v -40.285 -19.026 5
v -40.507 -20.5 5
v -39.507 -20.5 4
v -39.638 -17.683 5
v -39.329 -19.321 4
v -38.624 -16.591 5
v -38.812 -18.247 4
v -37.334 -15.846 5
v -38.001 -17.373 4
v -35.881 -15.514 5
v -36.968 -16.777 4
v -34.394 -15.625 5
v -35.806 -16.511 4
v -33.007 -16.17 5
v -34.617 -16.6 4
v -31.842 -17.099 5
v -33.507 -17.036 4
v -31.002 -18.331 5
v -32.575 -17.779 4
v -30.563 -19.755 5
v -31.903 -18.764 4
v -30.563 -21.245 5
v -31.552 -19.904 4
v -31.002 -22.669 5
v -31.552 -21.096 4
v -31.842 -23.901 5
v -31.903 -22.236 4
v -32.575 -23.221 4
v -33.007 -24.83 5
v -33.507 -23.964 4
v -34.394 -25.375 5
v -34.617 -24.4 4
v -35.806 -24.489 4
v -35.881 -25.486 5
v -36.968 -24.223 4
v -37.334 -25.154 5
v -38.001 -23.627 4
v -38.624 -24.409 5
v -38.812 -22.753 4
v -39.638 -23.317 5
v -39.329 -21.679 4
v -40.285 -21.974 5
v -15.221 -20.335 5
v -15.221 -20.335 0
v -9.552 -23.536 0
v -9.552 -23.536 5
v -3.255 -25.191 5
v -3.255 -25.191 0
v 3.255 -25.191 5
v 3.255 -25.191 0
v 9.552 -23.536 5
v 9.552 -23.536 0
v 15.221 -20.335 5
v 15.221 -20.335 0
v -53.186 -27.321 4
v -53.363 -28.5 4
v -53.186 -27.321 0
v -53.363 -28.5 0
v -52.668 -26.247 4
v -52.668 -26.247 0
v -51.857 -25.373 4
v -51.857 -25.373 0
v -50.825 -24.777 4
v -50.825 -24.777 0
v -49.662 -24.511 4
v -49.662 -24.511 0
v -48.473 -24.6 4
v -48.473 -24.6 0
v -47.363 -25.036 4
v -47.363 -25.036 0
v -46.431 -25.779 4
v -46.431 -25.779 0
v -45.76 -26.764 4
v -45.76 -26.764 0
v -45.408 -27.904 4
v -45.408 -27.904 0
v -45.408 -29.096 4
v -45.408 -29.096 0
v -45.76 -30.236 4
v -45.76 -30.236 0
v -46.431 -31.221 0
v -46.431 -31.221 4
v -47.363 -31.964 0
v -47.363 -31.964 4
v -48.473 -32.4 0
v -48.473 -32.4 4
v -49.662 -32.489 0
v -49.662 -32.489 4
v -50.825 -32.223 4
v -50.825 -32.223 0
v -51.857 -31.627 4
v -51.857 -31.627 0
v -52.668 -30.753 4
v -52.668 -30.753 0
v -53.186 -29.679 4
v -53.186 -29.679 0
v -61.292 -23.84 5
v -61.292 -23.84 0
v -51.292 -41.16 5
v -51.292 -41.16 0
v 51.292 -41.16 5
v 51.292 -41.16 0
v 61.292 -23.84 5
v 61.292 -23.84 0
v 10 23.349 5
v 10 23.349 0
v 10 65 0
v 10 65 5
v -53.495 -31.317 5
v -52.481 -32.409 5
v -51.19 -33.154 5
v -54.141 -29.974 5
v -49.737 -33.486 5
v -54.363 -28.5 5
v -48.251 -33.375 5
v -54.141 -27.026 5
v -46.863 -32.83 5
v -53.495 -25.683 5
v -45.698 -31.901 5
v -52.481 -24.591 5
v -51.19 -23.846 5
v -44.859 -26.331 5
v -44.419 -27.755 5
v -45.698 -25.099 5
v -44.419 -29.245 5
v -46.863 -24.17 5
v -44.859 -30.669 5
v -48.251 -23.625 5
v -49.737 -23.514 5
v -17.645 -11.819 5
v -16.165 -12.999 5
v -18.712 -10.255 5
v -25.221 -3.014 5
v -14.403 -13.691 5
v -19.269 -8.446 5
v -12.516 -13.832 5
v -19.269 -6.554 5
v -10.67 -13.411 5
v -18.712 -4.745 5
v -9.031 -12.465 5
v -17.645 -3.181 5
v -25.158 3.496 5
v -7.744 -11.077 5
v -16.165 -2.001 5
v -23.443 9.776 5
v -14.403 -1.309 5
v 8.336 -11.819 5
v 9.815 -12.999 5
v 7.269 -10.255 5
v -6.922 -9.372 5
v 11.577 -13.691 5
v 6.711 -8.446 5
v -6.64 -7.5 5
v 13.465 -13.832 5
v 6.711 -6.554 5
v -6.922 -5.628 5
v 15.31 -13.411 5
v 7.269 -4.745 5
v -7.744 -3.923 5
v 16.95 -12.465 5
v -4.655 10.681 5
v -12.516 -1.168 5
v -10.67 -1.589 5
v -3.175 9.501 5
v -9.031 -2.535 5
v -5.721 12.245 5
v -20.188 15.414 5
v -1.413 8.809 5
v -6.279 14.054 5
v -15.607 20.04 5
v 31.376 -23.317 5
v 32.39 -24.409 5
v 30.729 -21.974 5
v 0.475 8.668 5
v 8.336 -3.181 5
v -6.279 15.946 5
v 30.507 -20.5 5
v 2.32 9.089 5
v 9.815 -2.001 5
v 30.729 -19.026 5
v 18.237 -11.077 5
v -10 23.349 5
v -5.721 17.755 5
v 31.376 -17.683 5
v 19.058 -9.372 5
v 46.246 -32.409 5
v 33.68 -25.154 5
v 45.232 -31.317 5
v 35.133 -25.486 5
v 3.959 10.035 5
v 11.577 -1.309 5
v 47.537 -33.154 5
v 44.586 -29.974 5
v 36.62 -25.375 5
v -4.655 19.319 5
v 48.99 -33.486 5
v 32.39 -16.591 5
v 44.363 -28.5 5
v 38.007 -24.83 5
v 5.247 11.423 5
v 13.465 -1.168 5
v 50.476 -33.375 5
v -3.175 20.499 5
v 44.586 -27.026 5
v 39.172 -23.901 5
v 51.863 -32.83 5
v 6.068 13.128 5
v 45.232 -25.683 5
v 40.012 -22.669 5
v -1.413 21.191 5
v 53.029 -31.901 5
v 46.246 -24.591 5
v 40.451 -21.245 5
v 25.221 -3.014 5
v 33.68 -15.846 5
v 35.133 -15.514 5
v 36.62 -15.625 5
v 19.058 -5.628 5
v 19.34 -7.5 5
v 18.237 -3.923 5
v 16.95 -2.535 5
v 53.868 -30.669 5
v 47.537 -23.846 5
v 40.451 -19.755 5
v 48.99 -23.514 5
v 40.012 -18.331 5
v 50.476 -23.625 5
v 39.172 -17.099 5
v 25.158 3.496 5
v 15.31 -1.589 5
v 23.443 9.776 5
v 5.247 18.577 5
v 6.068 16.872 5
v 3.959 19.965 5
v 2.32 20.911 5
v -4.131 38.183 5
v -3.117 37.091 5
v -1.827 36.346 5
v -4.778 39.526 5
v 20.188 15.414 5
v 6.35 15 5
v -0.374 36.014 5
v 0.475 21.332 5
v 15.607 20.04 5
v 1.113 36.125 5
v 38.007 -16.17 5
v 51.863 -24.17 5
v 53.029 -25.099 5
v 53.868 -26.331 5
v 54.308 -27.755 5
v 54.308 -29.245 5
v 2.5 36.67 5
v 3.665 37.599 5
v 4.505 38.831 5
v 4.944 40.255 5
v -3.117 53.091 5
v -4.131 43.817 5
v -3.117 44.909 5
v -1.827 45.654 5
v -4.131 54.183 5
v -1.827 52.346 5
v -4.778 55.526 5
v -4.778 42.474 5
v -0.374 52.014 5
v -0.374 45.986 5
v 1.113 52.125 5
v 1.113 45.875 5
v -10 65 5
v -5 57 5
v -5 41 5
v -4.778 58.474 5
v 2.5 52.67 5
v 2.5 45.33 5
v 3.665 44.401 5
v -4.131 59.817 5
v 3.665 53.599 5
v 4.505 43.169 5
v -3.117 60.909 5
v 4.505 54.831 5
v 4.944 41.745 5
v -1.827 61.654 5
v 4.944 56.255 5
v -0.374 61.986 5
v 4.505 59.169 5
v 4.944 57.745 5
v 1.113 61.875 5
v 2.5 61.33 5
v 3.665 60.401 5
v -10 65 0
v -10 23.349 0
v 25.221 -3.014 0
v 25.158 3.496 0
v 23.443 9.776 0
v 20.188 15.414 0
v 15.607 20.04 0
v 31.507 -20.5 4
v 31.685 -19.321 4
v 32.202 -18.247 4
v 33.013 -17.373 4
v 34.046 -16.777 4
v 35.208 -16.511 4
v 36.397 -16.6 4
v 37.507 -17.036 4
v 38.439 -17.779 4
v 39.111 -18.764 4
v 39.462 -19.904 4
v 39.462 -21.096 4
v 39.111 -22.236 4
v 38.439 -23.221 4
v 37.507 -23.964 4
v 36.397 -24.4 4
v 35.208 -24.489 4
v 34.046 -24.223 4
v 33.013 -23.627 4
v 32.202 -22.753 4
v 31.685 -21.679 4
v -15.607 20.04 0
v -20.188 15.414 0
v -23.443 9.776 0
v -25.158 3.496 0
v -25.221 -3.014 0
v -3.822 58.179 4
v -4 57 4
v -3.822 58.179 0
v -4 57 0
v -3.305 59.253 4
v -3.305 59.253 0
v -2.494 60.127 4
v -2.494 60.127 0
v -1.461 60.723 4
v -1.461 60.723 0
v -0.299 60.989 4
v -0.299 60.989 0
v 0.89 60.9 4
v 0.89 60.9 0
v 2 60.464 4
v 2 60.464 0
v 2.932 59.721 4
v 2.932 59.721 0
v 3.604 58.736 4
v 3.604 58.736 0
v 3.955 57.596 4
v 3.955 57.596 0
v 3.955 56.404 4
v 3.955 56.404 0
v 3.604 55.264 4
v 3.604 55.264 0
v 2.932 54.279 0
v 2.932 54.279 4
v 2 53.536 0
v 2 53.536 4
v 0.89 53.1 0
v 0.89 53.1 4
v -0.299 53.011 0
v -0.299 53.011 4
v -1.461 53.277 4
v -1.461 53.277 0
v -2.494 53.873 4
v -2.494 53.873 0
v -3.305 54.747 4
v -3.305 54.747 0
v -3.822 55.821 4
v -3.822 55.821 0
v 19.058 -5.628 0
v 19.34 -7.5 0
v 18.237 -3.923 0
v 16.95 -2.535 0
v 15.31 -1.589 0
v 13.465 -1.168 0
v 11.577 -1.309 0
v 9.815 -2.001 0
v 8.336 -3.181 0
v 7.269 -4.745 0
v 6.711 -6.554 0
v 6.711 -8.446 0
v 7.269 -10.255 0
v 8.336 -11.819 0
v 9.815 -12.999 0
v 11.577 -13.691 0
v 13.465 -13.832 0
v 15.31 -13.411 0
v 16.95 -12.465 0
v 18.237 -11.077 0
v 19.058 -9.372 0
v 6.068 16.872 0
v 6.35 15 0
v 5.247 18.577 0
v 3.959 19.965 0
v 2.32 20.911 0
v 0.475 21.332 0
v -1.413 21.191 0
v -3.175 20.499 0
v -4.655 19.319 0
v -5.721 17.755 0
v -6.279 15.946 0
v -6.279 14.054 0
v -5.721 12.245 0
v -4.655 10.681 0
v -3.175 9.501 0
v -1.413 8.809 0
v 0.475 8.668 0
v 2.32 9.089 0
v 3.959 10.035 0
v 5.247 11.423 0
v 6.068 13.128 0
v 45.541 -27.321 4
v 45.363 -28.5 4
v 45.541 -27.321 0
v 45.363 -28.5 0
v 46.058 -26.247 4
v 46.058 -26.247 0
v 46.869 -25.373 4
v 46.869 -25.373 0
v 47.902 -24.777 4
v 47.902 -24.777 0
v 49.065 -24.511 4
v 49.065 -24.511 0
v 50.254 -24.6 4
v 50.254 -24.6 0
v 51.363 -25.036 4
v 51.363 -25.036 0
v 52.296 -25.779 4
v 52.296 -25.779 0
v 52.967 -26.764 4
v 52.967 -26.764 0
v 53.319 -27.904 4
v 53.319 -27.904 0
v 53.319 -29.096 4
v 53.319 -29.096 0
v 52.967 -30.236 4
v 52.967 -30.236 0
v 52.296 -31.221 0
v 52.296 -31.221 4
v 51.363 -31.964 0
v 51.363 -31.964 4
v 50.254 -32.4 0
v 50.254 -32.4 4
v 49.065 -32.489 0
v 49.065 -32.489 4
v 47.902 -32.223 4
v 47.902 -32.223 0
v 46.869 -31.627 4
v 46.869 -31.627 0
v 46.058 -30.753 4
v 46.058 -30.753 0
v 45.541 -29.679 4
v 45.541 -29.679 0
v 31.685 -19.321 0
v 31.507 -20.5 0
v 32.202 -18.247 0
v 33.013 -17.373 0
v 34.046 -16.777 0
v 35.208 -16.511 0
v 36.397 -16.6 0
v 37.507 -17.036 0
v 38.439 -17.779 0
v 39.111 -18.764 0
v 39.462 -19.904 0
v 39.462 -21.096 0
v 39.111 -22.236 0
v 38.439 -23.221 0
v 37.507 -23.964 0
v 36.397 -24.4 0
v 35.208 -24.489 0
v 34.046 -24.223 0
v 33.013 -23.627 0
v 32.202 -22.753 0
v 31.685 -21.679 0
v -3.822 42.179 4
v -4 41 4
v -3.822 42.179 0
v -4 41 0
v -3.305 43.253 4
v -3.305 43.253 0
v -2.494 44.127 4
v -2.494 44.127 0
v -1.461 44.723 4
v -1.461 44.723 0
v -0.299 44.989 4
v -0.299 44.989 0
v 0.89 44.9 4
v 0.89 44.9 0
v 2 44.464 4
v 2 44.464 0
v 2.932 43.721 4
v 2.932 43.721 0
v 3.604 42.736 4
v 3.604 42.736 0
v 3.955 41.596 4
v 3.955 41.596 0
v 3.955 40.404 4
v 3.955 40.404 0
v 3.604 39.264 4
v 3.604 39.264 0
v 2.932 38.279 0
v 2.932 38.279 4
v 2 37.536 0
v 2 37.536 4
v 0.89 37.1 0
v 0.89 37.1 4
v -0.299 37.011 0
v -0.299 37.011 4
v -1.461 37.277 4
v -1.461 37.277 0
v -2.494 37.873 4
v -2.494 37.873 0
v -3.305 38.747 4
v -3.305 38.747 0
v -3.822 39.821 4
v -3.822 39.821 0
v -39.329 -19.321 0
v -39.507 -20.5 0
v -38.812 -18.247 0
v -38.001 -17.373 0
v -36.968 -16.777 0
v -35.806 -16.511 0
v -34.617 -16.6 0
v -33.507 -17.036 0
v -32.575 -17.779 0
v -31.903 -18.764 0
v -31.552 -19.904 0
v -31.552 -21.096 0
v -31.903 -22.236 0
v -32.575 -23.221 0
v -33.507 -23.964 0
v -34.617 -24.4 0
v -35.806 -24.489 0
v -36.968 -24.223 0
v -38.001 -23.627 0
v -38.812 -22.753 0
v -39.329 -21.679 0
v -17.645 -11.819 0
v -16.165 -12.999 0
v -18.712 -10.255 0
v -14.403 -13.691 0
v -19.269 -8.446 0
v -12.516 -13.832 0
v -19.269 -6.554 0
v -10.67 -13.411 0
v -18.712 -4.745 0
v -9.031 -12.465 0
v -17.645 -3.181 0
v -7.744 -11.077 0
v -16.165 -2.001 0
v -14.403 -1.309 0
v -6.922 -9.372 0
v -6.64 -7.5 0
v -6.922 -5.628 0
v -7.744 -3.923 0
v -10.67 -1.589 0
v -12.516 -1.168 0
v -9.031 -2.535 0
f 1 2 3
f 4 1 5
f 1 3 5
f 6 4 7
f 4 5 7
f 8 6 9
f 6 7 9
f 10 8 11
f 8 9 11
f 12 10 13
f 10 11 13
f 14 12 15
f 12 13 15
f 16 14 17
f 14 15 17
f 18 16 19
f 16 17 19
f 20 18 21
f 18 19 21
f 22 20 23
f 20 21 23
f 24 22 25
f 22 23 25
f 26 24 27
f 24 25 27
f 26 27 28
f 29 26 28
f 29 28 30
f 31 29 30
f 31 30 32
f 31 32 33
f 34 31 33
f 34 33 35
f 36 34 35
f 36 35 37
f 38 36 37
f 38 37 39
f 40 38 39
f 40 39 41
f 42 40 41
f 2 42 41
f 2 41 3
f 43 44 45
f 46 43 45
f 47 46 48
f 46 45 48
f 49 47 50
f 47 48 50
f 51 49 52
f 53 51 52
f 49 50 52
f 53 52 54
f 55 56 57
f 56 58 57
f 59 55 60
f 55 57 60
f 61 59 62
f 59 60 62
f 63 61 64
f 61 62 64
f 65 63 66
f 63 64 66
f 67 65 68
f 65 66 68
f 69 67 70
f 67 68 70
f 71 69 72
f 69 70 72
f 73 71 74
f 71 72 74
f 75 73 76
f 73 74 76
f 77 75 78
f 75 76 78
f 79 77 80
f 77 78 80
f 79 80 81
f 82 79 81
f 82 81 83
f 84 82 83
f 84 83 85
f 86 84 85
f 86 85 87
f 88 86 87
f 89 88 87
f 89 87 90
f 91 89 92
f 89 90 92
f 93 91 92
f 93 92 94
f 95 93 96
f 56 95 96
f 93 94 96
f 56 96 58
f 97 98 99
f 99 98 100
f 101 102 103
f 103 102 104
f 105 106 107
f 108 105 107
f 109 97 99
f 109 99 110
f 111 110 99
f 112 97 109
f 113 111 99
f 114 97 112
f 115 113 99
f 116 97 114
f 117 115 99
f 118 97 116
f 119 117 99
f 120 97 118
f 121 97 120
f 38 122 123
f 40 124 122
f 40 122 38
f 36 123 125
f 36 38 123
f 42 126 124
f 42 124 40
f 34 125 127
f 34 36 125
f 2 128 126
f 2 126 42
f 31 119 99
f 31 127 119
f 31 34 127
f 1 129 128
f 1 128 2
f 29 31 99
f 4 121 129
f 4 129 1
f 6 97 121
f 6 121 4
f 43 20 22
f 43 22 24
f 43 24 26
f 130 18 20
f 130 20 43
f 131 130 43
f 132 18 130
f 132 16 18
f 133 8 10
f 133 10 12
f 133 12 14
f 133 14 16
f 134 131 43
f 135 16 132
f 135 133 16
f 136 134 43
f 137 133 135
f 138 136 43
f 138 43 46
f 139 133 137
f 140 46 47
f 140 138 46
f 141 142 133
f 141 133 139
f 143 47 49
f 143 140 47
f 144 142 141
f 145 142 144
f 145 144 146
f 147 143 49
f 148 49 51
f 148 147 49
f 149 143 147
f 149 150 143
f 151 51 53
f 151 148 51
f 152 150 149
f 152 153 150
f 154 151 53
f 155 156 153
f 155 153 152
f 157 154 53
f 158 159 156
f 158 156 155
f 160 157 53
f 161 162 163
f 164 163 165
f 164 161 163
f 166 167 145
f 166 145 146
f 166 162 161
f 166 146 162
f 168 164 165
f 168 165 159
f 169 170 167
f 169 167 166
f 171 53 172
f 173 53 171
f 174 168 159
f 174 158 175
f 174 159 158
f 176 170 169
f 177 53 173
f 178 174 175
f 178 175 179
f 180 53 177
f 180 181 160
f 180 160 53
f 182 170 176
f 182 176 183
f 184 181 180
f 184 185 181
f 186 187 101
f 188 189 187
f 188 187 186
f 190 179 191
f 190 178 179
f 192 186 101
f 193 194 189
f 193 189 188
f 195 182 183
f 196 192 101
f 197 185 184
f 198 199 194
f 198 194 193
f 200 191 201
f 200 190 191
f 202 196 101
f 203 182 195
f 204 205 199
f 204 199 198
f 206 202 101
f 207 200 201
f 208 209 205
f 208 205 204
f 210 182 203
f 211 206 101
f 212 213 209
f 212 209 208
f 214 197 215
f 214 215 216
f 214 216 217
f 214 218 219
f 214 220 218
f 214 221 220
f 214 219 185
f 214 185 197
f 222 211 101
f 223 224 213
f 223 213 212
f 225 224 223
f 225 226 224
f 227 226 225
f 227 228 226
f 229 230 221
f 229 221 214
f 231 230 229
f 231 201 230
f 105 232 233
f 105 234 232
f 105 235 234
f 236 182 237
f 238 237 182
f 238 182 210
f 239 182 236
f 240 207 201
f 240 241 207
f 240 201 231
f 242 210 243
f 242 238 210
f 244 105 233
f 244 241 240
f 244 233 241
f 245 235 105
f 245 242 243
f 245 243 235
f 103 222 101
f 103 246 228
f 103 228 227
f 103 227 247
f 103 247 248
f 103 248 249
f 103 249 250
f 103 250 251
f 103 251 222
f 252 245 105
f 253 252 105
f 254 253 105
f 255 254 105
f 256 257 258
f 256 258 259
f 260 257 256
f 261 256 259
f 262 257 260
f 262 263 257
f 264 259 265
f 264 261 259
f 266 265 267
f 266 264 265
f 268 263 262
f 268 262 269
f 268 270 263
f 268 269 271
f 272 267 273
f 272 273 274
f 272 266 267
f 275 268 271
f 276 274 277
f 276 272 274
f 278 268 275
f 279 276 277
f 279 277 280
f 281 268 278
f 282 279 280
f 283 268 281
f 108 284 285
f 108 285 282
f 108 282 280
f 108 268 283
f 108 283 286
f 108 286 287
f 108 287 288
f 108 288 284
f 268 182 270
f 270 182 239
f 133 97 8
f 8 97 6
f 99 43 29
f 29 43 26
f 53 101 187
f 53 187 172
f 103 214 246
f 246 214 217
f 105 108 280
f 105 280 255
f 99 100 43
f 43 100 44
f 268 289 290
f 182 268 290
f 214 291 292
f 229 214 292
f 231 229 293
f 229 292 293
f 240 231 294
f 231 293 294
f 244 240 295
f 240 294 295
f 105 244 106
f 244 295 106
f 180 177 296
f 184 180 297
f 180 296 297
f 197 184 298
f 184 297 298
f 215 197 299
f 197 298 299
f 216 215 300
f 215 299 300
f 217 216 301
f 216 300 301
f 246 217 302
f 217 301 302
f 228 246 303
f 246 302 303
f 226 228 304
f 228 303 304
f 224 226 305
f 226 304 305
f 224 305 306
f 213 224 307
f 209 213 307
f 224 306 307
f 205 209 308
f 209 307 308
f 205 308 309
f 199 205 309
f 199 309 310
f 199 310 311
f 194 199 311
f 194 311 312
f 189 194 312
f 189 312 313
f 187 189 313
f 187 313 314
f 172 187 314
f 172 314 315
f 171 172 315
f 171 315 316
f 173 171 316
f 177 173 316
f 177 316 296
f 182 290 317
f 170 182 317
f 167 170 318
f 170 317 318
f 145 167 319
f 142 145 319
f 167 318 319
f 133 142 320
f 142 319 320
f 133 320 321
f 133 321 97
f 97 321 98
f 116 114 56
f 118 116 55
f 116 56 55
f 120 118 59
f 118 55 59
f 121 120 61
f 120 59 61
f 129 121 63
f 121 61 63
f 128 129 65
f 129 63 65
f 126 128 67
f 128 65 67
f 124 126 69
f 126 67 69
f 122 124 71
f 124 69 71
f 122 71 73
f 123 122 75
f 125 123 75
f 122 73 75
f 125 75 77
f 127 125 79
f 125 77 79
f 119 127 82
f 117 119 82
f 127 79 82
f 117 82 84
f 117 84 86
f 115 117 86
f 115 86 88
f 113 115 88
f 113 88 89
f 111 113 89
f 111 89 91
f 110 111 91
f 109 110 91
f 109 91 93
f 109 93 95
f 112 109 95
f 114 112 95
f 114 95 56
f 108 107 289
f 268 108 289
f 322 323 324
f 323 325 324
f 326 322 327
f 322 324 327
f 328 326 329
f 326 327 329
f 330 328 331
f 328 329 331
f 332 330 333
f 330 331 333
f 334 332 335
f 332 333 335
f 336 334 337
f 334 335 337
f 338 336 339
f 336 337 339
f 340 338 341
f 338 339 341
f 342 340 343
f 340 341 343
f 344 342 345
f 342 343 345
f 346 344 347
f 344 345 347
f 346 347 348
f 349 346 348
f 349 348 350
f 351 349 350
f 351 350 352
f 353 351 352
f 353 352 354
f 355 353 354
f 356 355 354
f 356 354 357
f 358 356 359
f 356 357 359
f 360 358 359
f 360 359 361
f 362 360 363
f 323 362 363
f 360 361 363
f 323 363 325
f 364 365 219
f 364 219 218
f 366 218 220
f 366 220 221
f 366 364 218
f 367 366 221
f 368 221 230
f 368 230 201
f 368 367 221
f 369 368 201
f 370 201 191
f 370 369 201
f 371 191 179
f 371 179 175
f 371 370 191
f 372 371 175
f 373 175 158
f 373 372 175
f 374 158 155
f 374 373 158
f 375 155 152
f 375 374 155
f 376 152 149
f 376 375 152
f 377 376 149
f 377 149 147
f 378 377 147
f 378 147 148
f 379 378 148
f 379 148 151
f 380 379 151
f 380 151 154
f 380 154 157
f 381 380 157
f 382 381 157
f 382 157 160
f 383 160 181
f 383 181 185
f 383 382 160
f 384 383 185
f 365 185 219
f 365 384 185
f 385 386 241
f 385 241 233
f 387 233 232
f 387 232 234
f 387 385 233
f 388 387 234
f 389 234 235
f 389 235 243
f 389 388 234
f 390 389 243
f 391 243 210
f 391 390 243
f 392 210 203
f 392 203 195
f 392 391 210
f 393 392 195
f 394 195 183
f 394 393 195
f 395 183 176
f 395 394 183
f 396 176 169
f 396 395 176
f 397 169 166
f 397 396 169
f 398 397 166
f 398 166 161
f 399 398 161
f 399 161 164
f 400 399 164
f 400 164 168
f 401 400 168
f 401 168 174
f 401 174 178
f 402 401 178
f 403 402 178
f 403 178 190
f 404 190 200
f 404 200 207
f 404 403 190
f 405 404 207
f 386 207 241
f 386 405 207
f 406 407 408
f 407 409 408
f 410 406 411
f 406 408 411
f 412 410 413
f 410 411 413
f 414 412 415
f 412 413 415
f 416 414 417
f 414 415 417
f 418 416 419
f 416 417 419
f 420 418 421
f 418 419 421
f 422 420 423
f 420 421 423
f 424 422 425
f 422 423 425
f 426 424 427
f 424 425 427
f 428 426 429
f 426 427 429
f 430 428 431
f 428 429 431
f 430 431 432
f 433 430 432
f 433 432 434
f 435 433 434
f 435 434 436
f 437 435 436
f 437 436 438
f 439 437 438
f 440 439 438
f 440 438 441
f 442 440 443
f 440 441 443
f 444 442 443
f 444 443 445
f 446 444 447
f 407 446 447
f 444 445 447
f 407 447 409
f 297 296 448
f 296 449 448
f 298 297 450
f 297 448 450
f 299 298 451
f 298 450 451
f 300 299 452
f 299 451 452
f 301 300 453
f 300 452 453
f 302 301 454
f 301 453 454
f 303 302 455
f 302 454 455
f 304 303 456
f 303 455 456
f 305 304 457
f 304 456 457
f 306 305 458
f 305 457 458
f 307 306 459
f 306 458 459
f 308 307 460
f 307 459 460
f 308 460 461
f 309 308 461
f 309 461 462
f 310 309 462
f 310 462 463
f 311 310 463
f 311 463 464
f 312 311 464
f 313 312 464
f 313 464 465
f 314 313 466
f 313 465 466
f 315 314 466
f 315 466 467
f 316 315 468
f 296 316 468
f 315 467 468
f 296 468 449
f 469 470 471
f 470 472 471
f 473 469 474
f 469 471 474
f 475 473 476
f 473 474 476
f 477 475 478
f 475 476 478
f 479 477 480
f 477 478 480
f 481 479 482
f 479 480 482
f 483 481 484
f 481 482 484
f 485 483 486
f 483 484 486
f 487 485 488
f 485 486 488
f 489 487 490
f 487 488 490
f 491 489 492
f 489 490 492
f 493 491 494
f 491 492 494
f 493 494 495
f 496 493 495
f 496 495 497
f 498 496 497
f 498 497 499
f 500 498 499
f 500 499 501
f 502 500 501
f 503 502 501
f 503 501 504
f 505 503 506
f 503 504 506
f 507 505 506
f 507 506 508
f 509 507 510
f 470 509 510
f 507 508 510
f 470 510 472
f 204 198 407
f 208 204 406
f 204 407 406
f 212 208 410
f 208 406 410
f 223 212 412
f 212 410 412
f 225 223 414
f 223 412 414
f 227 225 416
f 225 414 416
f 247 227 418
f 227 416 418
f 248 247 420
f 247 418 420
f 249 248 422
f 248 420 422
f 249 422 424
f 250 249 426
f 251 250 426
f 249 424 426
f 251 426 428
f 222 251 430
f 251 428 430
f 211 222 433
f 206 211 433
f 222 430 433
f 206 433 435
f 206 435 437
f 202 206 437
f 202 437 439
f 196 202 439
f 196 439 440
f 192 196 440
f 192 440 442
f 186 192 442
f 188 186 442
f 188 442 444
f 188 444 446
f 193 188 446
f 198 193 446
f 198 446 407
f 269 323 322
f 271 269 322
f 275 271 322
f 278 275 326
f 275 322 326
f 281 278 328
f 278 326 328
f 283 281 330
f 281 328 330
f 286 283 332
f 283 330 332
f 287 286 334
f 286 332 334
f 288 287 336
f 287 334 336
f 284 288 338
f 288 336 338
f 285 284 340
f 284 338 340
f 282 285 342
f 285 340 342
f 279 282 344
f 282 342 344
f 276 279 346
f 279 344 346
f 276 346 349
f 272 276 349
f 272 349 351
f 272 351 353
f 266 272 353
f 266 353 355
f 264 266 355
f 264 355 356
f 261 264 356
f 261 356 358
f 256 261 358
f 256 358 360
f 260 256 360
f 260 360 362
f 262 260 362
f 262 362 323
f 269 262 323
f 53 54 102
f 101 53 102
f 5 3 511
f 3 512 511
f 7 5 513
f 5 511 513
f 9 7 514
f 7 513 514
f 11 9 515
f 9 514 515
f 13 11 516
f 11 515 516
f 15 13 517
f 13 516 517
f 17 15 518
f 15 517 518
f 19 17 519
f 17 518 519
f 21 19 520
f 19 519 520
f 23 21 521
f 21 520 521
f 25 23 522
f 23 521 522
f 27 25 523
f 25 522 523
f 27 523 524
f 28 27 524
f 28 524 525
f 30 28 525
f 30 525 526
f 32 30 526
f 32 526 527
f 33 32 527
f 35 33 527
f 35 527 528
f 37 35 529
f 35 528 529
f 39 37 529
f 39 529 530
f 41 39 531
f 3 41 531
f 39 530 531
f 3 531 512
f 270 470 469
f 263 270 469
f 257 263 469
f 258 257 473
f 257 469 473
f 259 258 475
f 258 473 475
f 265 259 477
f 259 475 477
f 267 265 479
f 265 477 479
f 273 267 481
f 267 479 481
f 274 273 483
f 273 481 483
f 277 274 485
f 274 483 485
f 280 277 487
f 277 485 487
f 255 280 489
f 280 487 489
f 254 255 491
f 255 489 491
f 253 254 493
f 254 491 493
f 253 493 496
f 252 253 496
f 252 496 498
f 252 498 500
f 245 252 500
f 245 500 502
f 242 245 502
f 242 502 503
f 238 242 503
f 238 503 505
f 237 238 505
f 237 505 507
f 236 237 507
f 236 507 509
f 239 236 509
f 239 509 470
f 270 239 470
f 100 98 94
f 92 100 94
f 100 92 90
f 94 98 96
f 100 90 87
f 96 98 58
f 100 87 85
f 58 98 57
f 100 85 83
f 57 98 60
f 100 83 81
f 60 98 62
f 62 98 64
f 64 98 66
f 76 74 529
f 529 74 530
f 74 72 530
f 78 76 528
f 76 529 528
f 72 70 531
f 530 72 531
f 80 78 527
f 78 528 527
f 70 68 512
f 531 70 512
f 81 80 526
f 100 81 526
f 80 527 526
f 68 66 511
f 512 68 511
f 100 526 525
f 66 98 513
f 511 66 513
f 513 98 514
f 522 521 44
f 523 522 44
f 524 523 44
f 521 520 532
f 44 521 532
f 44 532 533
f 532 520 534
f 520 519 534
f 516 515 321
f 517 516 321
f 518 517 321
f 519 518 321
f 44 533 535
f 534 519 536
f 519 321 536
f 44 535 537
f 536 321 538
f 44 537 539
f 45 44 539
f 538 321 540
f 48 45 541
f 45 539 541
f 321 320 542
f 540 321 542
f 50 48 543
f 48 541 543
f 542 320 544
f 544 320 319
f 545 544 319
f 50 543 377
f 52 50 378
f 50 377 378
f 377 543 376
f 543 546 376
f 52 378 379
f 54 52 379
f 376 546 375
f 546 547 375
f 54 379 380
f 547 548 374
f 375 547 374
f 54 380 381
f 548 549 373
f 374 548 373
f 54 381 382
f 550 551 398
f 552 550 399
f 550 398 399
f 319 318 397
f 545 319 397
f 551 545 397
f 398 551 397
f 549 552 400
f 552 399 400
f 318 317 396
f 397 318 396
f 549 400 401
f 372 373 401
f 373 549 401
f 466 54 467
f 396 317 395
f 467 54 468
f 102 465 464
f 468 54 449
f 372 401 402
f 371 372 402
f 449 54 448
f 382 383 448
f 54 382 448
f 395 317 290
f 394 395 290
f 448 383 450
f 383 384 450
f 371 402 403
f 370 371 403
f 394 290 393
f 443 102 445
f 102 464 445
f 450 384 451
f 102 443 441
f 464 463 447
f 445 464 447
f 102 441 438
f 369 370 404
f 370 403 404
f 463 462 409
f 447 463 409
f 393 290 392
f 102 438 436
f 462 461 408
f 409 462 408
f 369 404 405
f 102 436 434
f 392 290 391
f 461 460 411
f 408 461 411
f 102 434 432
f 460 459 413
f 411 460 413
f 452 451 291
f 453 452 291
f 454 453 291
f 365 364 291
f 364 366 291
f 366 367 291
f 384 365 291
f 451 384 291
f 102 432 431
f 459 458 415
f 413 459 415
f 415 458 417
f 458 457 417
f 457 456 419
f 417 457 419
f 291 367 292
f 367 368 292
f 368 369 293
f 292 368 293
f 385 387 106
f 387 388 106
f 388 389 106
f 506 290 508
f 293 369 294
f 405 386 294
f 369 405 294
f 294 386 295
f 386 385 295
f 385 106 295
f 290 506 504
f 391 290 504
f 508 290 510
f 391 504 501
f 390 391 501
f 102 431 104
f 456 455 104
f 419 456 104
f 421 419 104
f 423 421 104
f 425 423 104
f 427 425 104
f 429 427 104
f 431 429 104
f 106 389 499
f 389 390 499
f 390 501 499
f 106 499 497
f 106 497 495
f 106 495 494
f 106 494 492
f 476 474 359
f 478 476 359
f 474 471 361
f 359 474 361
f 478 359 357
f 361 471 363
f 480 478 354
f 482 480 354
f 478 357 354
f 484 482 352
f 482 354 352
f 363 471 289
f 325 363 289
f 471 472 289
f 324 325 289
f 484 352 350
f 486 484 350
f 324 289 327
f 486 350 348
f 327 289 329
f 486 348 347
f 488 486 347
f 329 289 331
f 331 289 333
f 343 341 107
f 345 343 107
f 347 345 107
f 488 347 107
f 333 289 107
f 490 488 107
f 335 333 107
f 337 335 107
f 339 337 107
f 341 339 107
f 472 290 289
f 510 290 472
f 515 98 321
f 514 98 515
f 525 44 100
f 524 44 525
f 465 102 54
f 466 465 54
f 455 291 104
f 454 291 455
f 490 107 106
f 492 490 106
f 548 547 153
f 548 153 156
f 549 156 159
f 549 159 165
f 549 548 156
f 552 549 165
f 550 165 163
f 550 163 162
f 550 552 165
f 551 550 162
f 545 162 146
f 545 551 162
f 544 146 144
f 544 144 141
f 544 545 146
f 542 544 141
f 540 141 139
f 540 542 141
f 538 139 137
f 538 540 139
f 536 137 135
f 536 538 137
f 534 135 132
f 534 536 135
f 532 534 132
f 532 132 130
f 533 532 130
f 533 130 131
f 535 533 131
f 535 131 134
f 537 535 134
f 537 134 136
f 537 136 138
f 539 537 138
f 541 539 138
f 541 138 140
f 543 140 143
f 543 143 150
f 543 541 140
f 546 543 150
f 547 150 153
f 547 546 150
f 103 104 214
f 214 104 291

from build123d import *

# Parameters (mm, degrees)
F0_R           = 6.35
F1_DEPTH       = 5
F3_D           = 8
F3_CSINK_D     = 10
F3_CSINK_ANGLE = 90


with BuildPart() as f1:
    # F0 (on Top) → F1 (new body)
    with BuildSketch(Plane.XY):
        with BuildLine():
            Line((-10, 65), (-10, 23.348662))
            ThreePointArc((-10, 23.348662), (-21.997045, 12.7), (-25.220534, -3.014077))
            Line((-25.220534, -3.014077), (-61.291651, -23.839746))
            Line((-61.291651, -23.839746), (-51.291651, -41.160254))
            Line((-51.291651, -41.160254), (-15.220534, -20.334585))
            ThreePointArc((-15.220534, -20.334585), (0, -25.4), (15.220534, -20.334585))
            Line((15.220534, -20.334585), (51.291651, -41.160254))
            Line((51.291651, -41.160254), (61.291651, -23.839746))
            Line((61.291651, -23.839746), (25.220534, -3.014077))
            ThreePointArc((25.220534, -3.014077), (21.997045, 12.7), (10, 23.348662))
            Line((10, 23.348662), (10, 65))
            Line((10, 65), (-10, 65))
        make_face()
        with Locations((-12.990381, -7.5)):
            Circle(F0_R, mode=Mode.SUBTRACT)
        with Locations((12.990381, -7.5)):
            Circle(F0_R, mode=Mode.SUBTRACT)
        with Locations((0, 15)):
            Circle(F0_R, mode=Mode.SUBTRACT)
    extrude(amount=F1_DEPTH)

    # F3 (through all)
    with Locations(Plane.XY.offset(5)):
        with Locations((0, 57), (0, 41), (35.507042, -20.5), (49.363448, -28.5), (-35.507042, -20.5), (-49.363448, -28.5)):
            CounterSinkHole(F3_D / 2, F3_CSINK_D / 2, counter_sink_angle=F3_CSINK_ANGLE)


solid = f1.part
